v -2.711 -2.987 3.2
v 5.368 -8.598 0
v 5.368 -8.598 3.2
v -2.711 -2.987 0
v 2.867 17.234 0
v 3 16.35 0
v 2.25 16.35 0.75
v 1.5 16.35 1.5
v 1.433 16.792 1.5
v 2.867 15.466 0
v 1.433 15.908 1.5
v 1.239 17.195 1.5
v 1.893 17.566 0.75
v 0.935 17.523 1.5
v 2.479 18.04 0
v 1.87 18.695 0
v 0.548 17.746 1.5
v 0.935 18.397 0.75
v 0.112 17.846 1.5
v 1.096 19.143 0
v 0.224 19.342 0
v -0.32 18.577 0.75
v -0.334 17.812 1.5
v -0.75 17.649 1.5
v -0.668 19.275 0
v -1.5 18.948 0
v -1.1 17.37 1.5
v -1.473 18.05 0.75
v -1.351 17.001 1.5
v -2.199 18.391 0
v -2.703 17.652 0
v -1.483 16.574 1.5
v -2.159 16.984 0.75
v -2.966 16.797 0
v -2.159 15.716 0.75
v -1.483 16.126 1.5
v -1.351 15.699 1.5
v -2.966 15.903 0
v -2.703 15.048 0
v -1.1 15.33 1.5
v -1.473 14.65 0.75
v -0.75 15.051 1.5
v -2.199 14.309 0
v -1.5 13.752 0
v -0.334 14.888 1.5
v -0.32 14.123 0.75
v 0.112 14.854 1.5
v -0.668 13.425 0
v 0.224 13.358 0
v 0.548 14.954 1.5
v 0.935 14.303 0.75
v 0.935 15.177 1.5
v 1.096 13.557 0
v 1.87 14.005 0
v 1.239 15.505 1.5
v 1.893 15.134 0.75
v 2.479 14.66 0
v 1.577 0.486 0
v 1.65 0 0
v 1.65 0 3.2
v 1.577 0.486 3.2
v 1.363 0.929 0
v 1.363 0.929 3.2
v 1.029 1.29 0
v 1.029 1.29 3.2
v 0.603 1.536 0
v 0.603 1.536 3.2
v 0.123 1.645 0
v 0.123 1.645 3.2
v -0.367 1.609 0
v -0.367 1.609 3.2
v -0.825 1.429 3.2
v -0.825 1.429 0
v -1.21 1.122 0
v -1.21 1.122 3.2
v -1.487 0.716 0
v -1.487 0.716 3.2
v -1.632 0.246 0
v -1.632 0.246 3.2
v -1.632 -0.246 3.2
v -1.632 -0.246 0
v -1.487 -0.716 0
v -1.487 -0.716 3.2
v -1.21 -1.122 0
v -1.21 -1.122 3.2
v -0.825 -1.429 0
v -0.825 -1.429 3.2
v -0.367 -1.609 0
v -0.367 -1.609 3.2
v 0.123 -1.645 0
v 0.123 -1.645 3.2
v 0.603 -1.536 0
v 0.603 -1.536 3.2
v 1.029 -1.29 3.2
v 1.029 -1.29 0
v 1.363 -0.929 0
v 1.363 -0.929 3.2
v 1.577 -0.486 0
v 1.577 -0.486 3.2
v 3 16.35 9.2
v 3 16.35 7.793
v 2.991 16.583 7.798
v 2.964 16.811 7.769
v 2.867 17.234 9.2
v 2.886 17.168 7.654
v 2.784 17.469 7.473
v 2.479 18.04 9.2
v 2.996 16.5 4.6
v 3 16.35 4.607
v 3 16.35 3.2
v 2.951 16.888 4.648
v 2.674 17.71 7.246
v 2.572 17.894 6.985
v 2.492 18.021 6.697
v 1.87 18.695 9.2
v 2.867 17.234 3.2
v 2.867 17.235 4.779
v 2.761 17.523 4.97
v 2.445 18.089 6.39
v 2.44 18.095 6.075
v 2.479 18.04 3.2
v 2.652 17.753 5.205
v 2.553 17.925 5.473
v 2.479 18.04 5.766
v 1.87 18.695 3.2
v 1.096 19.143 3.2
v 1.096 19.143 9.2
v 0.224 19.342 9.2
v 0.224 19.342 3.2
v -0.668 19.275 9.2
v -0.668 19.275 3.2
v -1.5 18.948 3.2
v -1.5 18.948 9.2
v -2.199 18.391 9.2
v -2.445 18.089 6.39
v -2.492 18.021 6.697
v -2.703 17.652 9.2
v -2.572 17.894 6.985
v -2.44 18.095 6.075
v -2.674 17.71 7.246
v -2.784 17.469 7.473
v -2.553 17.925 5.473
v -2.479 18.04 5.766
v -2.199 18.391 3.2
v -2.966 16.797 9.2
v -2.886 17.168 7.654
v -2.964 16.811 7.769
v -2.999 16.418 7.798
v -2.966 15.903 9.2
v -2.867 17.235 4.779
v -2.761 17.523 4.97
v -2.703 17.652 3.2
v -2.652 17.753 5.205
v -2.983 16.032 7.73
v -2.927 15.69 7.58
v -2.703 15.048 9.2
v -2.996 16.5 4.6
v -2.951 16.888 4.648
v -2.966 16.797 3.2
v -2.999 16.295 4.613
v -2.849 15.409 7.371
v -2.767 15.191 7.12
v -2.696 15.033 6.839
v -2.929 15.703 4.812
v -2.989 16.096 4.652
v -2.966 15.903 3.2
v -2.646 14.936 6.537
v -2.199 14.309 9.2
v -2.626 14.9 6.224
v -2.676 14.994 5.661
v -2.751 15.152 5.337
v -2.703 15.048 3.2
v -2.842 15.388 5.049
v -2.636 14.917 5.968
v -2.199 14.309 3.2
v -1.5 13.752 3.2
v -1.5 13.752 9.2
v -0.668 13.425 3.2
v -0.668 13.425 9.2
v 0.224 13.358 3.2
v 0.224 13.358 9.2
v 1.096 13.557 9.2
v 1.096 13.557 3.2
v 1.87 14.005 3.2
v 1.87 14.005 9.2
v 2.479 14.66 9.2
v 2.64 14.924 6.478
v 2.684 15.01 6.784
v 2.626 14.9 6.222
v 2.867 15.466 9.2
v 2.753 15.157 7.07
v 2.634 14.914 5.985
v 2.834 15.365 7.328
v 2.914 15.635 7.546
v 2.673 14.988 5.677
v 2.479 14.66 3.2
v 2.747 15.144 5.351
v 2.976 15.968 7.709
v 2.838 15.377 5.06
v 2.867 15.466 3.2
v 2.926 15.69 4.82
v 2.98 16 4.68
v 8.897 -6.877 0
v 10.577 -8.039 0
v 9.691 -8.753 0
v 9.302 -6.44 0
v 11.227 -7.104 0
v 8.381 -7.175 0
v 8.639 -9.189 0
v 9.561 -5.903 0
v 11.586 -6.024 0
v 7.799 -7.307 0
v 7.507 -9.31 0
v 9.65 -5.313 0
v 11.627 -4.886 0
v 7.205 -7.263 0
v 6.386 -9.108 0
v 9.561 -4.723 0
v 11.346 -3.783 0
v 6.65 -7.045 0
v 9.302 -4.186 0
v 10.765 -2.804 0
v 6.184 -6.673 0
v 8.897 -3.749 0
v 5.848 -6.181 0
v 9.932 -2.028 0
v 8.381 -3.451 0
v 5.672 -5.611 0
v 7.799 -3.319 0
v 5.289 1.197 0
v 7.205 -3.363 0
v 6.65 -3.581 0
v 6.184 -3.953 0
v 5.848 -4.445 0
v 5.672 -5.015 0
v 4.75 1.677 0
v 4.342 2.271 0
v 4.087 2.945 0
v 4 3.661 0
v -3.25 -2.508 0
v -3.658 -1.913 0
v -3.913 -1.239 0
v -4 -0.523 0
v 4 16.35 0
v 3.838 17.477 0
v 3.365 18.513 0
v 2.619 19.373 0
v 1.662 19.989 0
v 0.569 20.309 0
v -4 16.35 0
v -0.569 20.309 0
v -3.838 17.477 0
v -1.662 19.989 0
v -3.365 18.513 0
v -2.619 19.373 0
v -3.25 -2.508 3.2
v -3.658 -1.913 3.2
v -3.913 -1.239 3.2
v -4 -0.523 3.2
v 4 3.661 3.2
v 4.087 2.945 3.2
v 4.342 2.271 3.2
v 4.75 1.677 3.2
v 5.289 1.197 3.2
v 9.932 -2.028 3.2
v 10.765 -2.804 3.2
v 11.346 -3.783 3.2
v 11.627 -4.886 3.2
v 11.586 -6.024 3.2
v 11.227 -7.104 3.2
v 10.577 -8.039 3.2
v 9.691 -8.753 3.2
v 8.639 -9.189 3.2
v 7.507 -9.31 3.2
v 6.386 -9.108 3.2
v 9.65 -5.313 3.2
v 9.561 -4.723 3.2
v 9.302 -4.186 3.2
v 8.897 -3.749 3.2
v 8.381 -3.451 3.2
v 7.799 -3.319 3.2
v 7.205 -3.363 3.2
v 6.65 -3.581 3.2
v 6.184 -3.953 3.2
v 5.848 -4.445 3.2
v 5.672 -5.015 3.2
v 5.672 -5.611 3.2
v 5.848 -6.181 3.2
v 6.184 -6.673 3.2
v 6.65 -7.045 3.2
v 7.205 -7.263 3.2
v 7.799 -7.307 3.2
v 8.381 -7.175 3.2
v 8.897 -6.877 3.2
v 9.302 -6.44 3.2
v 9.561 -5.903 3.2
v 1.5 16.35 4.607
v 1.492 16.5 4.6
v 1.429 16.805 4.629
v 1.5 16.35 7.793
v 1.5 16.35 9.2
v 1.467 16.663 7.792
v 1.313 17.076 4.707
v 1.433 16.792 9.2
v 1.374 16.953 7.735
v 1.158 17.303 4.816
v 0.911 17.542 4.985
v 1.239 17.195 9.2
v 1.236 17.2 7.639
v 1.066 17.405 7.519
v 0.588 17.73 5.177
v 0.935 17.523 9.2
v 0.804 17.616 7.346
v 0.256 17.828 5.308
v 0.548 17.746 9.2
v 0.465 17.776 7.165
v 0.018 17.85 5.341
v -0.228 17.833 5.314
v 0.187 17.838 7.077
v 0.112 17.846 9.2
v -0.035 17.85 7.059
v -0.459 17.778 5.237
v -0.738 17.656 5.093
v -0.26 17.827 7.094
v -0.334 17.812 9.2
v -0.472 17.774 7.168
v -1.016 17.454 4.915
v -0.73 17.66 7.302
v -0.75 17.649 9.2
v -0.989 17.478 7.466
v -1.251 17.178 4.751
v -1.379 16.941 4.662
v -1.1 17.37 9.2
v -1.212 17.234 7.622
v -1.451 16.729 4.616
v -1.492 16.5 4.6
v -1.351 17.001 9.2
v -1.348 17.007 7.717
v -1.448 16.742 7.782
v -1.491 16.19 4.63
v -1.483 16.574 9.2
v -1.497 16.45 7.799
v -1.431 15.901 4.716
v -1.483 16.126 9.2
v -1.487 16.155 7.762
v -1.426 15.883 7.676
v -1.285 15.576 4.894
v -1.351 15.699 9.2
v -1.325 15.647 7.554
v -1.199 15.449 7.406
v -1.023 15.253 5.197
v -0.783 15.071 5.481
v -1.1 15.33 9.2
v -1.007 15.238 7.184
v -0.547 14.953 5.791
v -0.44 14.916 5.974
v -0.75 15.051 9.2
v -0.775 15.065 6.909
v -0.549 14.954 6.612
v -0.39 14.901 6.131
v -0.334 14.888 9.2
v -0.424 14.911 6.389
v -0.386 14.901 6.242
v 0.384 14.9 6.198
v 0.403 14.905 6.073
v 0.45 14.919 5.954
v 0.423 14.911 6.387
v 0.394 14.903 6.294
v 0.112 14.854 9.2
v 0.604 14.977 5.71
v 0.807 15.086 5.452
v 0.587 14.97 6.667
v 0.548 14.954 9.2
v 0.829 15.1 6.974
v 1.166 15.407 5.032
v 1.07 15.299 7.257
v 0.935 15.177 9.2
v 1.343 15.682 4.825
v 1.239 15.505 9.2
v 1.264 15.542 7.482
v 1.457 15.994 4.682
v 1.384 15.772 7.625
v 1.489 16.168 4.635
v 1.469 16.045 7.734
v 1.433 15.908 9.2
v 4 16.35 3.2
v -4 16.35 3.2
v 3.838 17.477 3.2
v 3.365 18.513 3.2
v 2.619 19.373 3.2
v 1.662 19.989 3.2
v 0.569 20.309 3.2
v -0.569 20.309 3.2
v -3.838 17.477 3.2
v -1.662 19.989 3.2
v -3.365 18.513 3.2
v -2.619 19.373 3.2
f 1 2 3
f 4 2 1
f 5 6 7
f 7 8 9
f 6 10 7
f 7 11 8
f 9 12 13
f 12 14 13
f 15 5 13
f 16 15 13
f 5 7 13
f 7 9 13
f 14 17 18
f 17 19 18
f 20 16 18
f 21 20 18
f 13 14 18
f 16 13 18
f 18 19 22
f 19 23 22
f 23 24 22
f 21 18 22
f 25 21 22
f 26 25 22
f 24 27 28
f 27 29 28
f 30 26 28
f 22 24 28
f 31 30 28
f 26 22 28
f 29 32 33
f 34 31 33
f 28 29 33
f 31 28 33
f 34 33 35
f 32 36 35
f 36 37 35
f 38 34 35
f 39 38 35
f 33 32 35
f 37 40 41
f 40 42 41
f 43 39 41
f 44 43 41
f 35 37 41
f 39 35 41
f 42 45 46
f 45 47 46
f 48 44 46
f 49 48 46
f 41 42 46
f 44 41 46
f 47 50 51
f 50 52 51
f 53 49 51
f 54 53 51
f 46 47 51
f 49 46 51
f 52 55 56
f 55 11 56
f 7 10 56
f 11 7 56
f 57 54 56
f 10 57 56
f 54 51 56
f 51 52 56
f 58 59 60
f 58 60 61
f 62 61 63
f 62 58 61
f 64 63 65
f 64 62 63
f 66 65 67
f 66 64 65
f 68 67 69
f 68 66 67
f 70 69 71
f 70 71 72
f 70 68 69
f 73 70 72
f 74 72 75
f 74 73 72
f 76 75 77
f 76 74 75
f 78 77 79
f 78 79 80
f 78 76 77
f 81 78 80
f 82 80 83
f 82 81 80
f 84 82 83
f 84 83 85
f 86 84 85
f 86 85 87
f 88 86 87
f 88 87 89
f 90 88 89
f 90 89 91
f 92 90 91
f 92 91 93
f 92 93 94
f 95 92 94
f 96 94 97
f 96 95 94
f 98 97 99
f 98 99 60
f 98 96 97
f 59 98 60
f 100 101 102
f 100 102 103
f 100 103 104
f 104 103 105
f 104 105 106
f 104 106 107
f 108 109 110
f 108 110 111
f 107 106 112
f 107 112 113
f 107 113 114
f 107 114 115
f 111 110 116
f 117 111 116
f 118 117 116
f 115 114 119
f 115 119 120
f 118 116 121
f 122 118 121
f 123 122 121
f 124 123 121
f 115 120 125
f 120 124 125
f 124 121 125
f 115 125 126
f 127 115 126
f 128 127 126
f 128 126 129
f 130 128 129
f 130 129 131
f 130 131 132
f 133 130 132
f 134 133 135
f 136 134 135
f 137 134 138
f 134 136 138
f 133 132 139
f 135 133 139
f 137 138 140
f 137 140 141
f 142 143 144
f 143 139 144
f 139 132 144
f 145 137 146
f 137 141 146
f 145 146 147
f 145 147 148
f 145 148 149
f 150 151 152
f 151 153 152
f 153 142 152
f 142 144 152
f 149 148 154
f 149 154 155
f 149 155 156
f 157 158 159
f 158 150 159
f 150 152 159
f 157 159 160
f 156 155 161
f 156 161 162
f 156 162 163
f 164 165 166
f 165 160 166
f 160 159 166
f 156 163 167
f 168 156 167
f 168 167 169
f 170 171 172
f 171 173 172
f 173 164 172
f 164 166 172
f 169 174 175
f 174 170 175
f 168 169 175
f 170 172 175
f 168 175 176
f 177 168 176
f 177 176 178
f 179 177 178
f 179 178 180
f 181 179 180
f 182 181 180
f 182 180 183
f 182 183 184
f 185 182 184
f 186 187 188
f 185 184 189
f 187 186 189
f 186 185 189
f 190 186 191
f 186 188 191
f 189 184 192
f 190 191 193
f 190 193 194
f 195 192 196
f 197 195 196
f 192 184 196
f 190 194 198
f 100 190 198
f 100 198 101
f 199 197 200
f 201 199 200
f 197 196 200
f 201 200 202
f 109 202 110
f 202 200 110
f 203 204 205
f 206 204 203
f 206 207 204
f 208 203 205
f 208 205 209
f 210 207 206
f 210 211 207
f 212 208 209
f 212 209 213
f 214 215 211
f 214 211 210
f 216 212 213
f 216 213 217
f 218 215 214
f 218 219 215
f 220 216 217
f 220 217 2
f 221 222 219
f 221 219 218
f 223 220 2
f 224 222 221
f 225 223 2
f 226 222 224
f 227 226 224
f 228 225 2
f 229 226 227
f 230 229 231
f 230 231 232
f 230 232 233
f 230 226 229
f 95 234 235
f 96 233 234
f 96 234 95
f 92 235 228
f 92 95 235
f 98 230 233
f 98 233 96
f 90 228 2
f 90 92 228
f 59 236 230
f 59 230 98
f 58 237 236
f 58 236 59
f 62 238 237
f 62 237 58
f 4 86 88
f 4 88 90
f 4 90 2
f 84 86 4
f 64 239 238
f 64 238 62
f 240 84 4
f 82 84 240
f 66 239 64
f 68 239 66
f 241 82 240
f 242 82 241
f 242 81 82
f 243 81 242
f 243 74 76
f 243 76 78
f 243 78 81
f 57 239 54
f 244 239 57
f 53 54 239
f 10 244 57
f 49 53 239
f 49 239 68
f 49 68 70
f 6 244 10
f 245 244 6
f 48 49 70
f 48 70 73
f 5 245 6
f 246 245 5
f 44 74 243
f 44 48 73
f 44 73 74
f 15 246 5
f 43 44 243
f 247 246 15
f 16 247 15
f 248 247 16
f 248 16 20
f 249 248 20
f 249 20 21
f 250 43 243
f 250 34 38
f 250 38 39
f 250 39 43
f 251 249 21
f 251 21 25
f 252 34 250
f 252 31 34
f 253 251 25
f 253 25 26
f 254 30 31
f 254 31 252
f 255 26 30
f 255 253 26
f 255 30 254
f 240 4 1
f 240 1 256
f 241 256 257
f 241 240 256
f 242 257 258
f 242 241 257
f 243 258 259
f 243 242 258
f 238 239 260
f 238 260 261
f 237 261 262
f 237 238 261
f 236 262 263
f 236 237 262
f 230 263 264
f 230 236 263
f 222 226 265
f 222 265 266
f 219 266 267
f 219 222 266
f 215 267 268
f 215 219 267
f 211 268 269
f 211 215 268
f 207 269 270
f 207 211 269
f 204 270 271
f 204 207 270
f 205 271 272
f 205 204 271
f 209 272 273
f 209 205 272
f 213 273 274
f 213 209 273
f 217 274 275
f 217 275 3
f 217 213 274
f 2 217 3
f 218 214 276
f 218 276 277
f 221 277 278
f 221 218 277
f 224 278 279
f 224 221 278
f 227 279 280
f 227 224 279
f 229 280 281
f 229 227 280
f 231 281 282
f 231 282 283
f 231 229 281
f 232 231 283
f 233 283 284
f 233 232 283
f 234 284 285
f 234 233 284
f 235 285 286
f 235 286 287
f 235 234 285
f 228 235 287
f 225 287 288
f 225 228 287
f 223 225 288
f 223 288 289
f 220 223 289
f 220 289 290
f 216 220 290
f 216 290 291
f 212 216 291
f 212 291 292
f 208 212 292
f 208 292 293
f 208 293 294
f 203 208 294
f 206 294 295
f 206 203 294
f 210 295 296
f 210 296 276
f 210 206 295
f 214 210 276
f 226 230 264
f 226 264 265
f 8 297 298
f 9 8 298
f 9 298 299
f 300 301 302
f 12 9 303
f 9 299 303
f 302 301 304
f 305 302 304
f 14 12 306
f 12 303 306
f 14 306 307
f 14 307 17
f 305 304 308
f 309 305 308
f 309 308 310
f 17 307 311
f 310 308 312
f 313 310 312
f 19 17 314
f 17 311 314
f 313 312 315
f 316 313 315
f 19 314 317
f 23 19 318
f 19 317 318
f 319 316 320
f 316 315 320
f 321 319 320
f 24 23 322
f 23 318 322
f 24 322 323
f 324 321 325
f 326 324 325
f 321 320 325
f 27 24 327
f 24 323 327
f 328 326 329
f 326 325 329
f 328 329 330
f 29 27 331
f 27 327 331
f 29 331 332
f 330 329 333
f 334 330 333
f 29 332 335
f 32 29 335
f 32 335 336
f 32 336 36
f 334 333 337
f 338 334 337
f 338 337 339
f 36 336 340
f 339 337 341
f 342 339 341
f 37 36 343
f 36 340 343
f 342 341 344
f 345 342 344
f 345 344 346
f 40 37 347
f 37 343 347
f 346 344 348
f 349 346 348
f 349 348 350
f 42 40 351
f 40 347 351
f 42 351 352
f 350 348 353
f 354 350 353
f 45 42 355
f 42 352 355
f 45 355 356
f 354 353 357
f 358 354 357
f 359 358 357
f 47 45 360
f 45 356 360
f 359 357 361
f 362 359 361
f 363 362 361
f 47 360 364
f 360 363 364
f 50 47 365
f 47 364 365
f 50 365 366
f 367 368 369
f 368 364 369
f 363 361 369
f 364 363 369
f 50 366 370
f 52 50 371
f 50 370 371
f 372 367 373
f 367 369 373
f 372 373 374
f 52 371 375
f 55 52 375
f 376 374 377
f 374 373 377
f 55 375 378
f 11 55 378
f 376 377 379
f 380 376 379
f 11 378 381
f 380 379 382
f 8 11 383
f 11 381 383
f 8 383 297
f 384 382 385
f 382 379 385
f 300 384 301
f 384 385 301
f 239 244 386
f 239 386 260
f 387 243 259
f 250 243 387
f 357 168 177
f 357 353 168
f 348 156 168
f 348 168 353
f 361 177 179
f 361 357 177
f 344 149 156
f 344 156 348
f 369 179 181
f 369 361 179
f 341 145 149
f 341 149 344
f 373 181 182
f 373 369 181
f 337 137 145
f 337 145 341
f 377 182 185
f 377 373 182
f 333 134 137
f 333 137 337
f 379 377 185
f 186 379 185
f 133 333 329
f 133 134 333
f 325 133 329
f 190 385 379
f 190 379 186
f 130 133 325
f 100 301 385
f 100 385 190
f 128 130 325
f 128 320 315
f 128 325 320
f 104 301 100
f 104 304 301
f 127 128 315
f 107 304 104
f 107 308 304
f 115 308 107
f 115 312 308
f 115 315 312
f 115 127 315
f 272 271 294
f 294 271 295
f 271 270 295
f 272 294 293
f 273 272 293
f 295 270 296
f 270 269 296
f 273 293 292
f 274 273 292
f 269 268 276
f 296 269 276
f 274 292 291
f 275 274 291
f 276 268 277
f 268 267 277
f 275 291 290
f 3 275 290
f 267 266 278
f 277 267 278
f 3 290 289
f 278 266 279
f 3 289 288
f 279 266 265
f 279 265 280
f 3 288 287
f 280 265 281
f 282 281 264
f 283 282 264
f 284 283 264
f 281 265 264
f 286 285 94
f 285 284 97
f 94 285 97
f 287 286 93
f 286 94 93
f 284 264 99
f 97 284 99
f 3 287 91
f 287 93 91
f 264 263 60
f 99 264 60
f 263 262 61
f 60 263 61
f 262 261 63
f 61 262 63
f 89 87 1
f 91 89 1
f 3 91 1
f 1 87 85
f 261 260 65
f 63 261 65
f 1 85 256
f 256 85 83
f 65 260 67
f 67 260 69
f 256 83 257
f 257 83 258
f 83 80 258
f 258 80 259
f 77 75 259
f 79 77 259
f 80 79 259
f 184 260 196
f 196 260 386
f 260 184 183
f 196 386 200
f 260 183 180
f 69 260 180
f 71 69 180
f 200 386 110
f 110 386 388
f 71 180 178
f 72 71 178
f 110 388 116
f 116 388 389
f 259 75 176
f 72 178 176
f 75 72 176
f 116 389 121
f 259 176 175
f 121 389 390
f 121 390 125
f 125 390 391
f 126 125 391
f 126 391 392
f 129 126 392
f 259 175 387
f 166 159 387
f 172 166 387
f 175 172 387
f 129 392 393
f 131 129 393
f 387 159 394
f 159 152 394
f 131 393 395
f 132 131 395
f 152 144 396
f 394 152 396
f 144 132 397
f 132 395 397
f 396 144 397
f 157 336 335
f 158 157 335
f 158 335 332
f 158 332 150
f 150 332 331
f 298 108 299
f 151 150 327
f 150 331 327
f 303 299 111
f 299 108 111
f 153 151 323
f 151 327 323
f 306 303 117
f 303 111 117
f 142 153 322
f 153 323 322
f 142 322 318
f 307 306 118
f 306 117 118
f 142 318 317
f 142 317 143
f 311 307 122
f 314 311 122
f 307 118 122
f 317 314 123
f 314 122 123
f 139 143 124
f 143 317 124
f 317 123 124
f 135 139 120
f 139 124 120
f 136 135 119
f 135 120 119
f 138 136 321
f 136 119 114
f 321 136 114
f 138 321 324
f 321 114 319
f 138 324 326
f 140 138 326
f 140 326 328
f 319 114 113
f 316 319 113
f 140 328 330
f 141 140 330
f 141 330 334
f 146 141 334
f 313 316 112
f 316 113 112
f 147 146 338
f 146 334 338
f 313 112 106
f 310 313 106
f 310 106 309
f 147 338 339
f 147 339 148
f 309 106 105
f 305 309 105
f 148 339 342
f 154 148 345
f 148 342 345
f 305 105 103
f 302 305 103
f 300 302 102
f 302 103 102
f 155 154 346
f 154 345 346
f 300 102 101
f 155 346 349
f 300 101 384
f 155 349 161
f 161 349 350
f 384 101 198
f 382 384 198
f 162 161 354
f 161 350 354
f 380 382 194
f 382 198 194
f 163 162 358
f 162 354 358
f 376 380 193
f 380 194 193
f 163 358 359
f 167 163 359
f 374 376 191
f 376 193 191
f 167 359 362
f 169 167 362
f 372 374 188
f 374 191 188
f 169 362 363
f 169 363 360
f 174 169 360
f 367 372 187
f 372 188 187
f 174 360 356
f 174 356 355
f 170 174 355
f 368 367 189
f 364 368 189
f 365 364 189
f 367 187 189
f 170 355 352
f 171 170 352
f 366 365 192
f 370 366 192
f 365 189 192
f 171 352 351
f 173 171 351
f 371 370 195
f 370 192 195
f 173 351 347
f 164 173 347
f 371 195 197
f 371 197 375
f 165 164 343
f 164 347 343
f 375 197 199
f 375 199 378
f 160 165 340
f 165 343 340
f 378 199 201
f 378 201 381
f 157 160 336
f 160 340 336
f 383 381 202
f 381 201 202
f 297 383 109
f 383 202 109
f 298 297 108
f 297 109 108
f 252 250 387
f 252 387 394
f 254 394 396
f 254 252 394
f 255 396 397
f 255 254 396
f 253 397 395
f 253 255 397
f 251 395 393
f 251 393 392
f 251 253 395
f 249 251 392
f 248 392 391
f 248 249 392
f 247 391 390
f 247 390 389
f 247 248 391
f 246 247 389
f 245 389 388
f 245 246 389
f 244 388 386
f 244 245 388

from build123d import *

# Parameters (mm, degrees)
SKETCH1_R                                       = 2
SKETCH1_R_2                                     = 1.65
BOSS_EXTRUDE1_DEPTH                             = 3.2
SKETCH5_R                                       = 3
BOSS_EXTRUDE2_DEPTH                             = 6
CSK_FOR_M3_FLAT_HEAD_MACHINE_SCREW2_D           = 3
CSK_FOR_M3_FLAT_HEAD_MACHINE_SCREW2_CSINK_D     = 6
CSK_FOR_M3_FLAT_HEAD_MACHINE_SCREW2_CSINK_ANGLE = 90
SKETCH8_R                                       = 1.6
CUT_EXTRUDE2_DEPTH                              = 16


with BuildPart() as part:
    # Sketch1 → Boss-Extrude1 (new body)
    with BuildSketch(Plane.XY):
        with BuildLine():
            Line((-4, -0.523005645), (-4, 16.35))
            ThreePointArc((-4, 16.35), (0, 20.35), (4, 16.35))
            Line((4, 16.35), (4, 3.661039513))
            ThreePointArc((4, 3.661039513), (4.341627544, 2.270695713), (5.288703922, 1.197005071))
            Line((5.288703922, 1.197005071), (9.931728104, -2.027620743))
            ThreePointArc((9.931728104, -2.027620743), (10.935379257, -7.594728104), (5.368271896, -8.598379257))
            Line((5.368271896, -8.598379257), (-2.711296078, -2.987040087))
            ThreePointArc((-2.711296078, -2.987040087), (-3.658372456, -1.913349445), (-4, -0.523005645))
        make_face()
        with Locations((7.65, -5.313)):
            Circle(SKETCH1_R, mode=Mode.SUBTRACT)
        Circle(SKETCH1_R_2, mode=Mode.SUBTRACT)
    extrude(amount=BOSS_EXTRUDE1_DEPTH)

    # Sketch5 → Boss-Extrude2 (add)
    with BuildSketch(Plane.XY.offset(3.2)):
        with Locations((0, 16.35)):
            Circle(SKETCH5_R)
    extrude(amount=BOSS_EXTRUDE2_DEPTH)

    # CSK for M3 Flat Head Machine Screw2 (through all)
    with Locations(Plane(origin=(0, 0, 0), x_dir=(-1, 0, 0), z_dir=(0, 0, -1))):
        with Locations((0, 16.35)):
            CounterSinkHole(CSK_FOR_M3_FLAT_HEAD_MACHINE_SCREW2_D / 2, CSK_FOR_M3_FLAT_HEAD_MACHINE_SCREW2_CSINK_D / 2, counter_sink_angle=CSK_FOR_M3_FLAT_HEAD_MACHINE_SCREW2_CSINK_ANGLE)

    # Sketch8 → Cut-Extrude2 (cut)
    with BuildSketch(Plane(origin=(4, 0, 0), x_dir=(0, 0, -1), z_dir=(1, 0, 0))):
        with Locations((-6.2, 16.5)):
            Circle(SKETCH8_R)
    extrude(amount=-CUT_EXTRUDE2_DEPTH, mode=Mode.SUBTRACT)


solid = part.part
